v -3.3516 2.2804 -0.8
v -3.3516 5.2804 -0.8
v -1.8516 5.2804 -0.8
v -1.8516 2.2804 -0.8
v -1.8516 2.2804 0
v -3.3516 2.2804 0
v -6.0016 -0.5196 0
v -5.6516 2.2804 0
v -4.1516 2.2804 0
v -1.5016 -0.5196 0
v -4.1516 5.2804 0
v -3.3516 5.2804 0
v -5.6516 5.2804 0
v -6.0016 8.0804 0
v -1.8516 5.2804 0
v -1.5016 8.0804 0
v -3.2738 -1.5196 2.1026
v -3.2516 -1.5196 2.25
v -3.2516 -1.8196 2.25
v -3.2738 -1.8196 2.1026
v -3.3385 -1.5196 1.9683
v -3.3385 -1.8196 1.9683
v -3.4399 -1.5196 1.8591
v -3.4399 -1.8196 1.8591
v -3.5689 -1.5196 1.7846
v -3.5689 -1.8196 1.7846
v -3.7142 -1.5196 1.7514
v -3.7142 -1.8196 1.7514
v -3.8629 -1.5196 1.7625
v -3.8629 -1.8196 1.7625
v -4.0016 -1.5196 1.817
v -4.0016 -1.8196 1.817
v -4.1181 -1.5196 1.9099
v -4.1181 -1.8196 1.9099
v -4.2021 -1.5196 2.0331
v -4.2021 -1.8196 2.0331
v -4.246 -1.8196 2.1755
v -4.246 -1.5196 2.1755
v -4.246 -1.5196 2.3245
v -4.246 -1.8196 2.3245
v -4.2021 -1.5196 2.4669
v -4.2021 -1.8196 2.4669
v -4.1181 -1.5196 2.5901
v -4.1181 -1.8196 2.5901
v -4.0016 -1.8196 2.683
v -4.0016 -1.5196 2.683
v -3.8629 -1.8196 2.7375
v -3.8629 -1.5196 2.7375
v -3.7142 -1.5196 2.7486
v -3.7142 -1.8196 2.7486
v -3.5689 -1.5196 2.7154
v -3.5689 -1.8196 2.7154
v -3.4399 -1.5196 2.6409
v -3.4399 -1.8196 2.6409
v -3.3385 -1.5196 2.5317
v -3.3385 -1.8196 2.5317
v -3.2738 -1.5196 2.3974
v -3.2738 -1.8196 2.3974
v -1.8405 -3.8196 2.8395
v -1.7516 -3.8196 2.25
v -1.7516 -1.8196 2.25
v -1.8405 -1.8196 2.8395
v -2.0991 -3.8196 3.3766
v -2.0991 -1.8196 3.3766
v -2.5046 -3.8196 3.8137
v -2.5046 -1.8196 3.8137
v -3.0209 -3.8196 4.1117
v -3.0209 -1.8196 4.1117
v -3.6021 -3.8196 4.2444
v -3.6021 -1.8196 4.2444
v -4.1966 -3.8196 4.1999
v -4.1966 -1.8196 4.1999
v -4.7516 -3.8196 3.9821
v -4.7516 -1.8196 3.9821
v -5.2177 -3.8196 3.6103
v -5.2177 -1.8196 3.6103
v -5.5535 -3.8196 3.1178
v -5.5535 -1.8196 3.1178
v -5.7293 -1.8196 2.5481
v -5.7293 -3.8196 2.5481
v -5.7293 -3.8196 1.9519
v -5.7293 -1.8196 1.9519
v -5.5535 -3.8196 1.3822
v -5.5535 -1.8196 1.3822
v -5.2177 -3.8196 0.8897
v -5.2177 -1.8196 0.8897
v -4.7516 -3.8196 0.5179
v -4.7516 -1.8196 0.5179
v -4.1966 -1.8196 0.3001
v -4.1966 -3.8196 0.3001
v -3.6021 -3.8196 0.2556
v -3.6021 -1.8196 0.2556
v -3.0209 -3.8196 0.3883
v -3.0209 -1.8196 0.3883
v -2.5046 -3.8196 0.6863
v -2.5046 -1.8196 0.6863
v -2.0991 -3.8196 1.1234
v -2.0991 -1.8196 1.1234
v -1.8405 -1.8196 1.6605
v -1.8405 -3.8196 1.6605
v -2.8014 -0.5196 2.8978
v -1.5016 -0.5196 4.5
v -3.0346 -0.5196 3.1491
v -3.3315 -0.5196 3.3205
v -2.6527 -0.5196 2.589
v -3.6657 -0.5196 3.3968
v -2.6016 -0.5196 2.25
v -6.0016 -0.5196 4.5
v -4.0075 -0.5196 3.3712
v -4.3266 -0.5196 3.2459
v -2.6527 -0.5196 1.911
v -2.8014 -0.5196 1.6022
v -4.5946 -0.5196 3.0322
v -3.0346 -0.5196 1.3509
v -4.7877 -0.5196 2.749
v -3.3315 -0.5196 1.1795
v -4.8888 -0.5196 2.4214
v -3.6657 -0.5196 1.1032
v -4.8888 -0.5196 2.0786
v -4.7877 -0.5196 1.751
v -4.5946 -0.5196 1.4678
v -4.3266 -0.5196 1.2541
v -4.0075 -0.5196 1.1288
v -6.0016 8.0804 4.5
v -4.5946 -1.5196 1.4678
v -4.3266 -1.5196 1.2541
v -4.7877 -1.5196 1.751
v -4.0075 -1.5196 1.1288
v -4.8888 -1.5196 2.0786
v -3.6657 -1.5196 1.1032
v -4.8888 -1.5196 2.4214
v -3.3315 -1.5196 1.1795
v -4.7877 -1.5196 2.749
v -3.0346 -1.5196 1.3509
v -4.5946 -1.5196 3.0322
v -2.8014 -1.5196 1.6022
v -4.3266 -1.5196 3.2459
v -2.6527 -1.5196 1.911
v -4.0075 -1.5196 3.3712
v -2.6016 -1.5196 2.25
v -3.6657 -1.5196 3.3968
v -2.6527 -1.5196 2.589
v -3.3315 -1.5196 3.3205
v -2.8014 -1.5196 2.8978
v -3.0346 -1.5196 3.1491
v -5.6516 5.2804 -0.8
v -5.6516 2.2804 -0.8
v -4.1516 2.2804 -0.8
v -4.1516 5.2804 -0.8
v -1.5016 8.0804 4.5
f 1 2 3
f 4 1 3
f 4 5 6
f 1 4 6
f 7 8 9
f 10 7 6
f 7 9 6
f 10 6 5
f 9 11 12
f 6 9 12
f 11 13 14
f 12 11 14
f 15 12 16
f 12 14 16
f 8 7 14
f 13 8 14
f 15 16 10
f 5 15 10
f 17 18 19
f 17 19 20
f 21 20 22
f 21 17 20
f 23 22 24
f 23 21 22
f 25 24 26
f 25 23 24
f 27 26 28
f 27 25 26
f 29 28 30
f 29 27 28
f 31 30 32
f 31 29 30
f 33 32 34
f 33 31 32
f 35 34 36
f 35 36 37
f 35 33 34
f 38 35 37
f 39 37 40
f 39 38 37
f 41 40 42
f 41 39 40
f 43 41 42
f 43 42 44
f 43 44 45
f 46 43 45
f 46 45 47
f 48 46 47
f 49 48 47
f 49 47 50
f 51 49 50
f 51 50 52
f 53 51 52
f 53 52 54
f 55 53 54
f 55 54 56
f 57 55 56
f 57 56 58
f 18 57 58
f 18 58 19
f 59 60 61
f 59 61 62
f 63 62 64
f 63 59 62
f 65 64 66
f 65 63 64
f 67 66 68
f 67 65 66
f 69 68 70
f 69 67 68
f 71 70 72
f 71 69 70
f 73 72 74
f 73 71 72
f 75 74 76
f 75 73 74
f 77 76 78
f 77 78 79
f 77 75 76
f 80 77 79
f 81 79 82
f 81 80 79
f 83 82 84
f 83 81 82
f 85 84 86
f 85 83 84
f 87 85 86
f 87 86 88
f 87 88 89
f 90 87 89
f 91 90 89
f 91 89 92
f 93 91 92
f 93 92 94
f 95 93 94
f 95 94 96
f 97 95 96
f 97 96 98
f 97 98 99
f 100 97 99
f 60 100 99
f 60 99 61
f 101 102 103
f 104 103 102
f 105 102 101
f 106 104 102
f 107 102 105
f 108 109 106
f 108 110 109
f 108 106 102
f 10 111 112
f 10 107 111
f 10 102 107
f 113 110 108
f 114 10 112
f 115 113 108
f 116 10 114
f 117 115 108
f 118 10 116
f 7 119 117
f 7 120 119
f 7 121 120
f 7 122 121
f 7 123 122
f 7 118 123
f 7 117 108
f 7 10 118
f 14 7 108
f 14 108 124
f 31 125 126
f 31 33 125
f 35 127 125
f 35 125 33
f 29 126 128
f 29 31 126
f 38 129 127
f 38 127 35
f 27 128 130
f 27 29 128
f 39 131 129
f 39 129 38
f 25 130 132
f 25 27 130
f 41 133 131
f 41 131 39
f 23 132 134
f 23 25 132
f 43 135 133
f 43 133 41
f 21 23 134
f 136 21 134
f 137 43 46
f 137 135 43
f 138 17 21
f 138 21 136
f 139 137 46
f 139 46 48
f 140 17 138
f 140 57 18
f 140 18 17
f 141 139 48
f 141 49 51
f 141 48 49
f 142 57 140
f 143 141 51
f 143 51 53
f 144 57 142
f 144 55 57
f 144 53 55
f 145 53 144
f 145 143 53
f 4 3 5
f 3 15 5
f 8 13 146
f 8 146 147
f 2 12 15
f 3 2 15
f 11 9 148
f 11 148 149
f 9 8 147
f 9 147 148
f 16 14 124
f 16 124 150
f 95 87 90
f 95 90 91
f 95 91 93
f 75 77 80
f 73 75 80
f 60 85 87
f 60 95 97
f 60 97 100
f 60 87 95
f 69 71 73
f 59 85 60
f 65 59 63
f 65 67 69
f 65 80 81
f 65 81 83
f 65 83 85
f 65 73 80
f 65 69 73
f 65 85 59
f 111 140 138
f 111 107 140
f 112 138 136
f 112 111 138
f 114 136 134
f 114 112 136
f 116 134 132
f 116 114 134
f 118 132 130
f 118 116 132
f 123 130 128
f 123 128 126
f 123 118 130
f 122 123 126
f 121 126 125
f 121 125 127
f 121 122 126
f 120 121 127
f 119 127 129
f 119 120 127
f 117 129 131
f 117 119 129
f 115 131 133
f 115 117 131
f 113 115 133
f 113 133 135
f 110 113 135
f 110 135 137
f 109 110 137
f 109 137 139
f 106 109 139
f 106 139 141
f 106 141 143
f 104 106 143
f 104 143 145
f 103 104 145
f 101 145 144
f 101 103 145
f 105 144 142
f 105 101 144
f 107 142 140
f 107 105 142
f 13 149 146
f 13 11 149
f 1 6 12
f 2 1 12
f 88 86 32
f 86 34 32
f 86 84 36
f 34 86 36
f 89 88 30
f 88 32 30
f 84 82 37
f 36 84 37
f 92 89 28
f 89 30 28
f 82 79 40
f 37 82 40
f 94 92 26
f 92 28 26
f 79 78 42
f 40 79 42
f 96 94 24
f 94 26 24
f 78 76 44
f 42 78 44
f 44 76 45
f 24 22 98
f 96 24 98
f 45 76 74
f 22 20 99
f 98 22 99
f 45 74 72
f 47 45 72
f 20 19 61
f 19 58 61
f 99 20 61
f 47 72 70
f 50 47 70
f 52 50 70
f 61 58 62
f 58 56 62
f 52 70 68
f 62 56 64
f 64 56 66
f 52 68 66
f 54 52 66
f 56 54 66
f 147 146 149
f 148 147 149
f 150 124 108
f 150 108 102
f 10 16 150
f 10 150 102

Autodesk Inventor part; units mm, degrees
ref_plane "YZ Plane" through (0, 0, 0) normal (1, 0, 0) x (0, 1, 0)
ref_plane "XZ Plane" through (0, 0, 0) normal (0, 1, 0) x (-1, 0, 0)
ref_plane "XY Plane" through (0, 0, 0) normal (0, 0, 1) x (1, 0, 0)
sketch "草图1" plane through (0, 0, 0) normal (0, 0, 1) x (1, 0, 0)
  line L0 (-6.0016, 8.0804) -> (-1.5016, 8.0804)
  line L1 (-1.5016, 8.0804) -> (-1.5016, -0.5196)
  line L2 (-1.5016, -0.5196) -> (-6.0016, -0.5196)
  line L3 (-6.0016, -0.5196) -> (-6.0016, 8.0804)
  line L4 (-3.7516, 8.0804) -> (-3.7516, -0.5196)
  line L5 (-3.3516, 5.2804) -> (-1.8516, 5.2804)
  line L6 (-1.8516, 5.2804) -> (-1.8516, 2.2804)
  line L7 (-1.8516, 2.2804) -> (-3.3516, 2.2804)
  line L8 (-3.3516, 2.2804) -> (-3.3516, 5.2804)
  line L9 (-4.1516, 5.2804) -> (-5.6516, 5.2804)
  line L10 (-5.6516, 5.2804) -> (-5.6516, 2.2804)
  line L11 (-5.6516, 2.2804) -> (-4.1516, 2.2804)
  line L12 (-4.1516, 2.2804) -> (-4.1516, 5.2804)
  point P0 (0, 0)
  dimension "d0" = 4.5
  dimension "d1" = 8.6
  dimension "d5" = 1.5
  dimension "d6" = 3
  dimension "d7" = 2.8
extrude "拉伸1" add sketch "草图1" along normal blind 4.5 contours L0 L4 L2 L3 | L0 L1 L2 L4 | L5 L6 L7 L8 | L12 L11 L10 L9
extrude "拉伸2" add sketch "草图1" against normal blind 0.8 contours L5 L6 L7 L8 | L12 L11 L10 L9
sketch "草图2" plane through (-6.0016, -0.5196, 0) normal (0, -1, 0) x (1, 0, 0)
  line L0 (0, 4.5) -> (4.5, 4.5) projected
  line L1 (2.25, 4.5) -> (2.25, 0)
  line L2 (4.5, 0) -> (0, 0) projected
  line L3 (4.5, 0) -> (4.5, 4.5) projected
  line L4 (4.5, 2.25) -> (0, 2.25)
  line L5 (0, 0) -> (0, 4.5) projected
  circle A0 centre (2.25, 2.25) radius 1.15
  point P0 (6.0016, 0)
  dimension "d10" = 2.3
extrude "拉伸3" add sketch "草图2" along normal blind 1 contours A0 L4 L1 | L1 L4 A0 | L4 L1 A0 | L4 A0 L1
sketch "草图3" plane through (-3.7516, -1.5196, 2.25) normal (0, -1, 0) x (1, 0, 0)
  circle A0 centre (0, 0) radius 0.5
  point P0 (3.7516, -2.25)
  dimension "d13" = 1
extrude "拉伸4" add sketch "草图3" along normal blind 2.3
sketch "草图4" plane through (-3.7516, -3.8196, 2.25) normal (0, -1, 0) x (1, 0, 0)
  circle A0 centre (0, 0) radius 2
  point P0 (3.7516, -2.25)
  dimension "d16" = 4
extrude "拉伸5" add sketch "草图4" against normal blind 2
properties part number "mortor"
